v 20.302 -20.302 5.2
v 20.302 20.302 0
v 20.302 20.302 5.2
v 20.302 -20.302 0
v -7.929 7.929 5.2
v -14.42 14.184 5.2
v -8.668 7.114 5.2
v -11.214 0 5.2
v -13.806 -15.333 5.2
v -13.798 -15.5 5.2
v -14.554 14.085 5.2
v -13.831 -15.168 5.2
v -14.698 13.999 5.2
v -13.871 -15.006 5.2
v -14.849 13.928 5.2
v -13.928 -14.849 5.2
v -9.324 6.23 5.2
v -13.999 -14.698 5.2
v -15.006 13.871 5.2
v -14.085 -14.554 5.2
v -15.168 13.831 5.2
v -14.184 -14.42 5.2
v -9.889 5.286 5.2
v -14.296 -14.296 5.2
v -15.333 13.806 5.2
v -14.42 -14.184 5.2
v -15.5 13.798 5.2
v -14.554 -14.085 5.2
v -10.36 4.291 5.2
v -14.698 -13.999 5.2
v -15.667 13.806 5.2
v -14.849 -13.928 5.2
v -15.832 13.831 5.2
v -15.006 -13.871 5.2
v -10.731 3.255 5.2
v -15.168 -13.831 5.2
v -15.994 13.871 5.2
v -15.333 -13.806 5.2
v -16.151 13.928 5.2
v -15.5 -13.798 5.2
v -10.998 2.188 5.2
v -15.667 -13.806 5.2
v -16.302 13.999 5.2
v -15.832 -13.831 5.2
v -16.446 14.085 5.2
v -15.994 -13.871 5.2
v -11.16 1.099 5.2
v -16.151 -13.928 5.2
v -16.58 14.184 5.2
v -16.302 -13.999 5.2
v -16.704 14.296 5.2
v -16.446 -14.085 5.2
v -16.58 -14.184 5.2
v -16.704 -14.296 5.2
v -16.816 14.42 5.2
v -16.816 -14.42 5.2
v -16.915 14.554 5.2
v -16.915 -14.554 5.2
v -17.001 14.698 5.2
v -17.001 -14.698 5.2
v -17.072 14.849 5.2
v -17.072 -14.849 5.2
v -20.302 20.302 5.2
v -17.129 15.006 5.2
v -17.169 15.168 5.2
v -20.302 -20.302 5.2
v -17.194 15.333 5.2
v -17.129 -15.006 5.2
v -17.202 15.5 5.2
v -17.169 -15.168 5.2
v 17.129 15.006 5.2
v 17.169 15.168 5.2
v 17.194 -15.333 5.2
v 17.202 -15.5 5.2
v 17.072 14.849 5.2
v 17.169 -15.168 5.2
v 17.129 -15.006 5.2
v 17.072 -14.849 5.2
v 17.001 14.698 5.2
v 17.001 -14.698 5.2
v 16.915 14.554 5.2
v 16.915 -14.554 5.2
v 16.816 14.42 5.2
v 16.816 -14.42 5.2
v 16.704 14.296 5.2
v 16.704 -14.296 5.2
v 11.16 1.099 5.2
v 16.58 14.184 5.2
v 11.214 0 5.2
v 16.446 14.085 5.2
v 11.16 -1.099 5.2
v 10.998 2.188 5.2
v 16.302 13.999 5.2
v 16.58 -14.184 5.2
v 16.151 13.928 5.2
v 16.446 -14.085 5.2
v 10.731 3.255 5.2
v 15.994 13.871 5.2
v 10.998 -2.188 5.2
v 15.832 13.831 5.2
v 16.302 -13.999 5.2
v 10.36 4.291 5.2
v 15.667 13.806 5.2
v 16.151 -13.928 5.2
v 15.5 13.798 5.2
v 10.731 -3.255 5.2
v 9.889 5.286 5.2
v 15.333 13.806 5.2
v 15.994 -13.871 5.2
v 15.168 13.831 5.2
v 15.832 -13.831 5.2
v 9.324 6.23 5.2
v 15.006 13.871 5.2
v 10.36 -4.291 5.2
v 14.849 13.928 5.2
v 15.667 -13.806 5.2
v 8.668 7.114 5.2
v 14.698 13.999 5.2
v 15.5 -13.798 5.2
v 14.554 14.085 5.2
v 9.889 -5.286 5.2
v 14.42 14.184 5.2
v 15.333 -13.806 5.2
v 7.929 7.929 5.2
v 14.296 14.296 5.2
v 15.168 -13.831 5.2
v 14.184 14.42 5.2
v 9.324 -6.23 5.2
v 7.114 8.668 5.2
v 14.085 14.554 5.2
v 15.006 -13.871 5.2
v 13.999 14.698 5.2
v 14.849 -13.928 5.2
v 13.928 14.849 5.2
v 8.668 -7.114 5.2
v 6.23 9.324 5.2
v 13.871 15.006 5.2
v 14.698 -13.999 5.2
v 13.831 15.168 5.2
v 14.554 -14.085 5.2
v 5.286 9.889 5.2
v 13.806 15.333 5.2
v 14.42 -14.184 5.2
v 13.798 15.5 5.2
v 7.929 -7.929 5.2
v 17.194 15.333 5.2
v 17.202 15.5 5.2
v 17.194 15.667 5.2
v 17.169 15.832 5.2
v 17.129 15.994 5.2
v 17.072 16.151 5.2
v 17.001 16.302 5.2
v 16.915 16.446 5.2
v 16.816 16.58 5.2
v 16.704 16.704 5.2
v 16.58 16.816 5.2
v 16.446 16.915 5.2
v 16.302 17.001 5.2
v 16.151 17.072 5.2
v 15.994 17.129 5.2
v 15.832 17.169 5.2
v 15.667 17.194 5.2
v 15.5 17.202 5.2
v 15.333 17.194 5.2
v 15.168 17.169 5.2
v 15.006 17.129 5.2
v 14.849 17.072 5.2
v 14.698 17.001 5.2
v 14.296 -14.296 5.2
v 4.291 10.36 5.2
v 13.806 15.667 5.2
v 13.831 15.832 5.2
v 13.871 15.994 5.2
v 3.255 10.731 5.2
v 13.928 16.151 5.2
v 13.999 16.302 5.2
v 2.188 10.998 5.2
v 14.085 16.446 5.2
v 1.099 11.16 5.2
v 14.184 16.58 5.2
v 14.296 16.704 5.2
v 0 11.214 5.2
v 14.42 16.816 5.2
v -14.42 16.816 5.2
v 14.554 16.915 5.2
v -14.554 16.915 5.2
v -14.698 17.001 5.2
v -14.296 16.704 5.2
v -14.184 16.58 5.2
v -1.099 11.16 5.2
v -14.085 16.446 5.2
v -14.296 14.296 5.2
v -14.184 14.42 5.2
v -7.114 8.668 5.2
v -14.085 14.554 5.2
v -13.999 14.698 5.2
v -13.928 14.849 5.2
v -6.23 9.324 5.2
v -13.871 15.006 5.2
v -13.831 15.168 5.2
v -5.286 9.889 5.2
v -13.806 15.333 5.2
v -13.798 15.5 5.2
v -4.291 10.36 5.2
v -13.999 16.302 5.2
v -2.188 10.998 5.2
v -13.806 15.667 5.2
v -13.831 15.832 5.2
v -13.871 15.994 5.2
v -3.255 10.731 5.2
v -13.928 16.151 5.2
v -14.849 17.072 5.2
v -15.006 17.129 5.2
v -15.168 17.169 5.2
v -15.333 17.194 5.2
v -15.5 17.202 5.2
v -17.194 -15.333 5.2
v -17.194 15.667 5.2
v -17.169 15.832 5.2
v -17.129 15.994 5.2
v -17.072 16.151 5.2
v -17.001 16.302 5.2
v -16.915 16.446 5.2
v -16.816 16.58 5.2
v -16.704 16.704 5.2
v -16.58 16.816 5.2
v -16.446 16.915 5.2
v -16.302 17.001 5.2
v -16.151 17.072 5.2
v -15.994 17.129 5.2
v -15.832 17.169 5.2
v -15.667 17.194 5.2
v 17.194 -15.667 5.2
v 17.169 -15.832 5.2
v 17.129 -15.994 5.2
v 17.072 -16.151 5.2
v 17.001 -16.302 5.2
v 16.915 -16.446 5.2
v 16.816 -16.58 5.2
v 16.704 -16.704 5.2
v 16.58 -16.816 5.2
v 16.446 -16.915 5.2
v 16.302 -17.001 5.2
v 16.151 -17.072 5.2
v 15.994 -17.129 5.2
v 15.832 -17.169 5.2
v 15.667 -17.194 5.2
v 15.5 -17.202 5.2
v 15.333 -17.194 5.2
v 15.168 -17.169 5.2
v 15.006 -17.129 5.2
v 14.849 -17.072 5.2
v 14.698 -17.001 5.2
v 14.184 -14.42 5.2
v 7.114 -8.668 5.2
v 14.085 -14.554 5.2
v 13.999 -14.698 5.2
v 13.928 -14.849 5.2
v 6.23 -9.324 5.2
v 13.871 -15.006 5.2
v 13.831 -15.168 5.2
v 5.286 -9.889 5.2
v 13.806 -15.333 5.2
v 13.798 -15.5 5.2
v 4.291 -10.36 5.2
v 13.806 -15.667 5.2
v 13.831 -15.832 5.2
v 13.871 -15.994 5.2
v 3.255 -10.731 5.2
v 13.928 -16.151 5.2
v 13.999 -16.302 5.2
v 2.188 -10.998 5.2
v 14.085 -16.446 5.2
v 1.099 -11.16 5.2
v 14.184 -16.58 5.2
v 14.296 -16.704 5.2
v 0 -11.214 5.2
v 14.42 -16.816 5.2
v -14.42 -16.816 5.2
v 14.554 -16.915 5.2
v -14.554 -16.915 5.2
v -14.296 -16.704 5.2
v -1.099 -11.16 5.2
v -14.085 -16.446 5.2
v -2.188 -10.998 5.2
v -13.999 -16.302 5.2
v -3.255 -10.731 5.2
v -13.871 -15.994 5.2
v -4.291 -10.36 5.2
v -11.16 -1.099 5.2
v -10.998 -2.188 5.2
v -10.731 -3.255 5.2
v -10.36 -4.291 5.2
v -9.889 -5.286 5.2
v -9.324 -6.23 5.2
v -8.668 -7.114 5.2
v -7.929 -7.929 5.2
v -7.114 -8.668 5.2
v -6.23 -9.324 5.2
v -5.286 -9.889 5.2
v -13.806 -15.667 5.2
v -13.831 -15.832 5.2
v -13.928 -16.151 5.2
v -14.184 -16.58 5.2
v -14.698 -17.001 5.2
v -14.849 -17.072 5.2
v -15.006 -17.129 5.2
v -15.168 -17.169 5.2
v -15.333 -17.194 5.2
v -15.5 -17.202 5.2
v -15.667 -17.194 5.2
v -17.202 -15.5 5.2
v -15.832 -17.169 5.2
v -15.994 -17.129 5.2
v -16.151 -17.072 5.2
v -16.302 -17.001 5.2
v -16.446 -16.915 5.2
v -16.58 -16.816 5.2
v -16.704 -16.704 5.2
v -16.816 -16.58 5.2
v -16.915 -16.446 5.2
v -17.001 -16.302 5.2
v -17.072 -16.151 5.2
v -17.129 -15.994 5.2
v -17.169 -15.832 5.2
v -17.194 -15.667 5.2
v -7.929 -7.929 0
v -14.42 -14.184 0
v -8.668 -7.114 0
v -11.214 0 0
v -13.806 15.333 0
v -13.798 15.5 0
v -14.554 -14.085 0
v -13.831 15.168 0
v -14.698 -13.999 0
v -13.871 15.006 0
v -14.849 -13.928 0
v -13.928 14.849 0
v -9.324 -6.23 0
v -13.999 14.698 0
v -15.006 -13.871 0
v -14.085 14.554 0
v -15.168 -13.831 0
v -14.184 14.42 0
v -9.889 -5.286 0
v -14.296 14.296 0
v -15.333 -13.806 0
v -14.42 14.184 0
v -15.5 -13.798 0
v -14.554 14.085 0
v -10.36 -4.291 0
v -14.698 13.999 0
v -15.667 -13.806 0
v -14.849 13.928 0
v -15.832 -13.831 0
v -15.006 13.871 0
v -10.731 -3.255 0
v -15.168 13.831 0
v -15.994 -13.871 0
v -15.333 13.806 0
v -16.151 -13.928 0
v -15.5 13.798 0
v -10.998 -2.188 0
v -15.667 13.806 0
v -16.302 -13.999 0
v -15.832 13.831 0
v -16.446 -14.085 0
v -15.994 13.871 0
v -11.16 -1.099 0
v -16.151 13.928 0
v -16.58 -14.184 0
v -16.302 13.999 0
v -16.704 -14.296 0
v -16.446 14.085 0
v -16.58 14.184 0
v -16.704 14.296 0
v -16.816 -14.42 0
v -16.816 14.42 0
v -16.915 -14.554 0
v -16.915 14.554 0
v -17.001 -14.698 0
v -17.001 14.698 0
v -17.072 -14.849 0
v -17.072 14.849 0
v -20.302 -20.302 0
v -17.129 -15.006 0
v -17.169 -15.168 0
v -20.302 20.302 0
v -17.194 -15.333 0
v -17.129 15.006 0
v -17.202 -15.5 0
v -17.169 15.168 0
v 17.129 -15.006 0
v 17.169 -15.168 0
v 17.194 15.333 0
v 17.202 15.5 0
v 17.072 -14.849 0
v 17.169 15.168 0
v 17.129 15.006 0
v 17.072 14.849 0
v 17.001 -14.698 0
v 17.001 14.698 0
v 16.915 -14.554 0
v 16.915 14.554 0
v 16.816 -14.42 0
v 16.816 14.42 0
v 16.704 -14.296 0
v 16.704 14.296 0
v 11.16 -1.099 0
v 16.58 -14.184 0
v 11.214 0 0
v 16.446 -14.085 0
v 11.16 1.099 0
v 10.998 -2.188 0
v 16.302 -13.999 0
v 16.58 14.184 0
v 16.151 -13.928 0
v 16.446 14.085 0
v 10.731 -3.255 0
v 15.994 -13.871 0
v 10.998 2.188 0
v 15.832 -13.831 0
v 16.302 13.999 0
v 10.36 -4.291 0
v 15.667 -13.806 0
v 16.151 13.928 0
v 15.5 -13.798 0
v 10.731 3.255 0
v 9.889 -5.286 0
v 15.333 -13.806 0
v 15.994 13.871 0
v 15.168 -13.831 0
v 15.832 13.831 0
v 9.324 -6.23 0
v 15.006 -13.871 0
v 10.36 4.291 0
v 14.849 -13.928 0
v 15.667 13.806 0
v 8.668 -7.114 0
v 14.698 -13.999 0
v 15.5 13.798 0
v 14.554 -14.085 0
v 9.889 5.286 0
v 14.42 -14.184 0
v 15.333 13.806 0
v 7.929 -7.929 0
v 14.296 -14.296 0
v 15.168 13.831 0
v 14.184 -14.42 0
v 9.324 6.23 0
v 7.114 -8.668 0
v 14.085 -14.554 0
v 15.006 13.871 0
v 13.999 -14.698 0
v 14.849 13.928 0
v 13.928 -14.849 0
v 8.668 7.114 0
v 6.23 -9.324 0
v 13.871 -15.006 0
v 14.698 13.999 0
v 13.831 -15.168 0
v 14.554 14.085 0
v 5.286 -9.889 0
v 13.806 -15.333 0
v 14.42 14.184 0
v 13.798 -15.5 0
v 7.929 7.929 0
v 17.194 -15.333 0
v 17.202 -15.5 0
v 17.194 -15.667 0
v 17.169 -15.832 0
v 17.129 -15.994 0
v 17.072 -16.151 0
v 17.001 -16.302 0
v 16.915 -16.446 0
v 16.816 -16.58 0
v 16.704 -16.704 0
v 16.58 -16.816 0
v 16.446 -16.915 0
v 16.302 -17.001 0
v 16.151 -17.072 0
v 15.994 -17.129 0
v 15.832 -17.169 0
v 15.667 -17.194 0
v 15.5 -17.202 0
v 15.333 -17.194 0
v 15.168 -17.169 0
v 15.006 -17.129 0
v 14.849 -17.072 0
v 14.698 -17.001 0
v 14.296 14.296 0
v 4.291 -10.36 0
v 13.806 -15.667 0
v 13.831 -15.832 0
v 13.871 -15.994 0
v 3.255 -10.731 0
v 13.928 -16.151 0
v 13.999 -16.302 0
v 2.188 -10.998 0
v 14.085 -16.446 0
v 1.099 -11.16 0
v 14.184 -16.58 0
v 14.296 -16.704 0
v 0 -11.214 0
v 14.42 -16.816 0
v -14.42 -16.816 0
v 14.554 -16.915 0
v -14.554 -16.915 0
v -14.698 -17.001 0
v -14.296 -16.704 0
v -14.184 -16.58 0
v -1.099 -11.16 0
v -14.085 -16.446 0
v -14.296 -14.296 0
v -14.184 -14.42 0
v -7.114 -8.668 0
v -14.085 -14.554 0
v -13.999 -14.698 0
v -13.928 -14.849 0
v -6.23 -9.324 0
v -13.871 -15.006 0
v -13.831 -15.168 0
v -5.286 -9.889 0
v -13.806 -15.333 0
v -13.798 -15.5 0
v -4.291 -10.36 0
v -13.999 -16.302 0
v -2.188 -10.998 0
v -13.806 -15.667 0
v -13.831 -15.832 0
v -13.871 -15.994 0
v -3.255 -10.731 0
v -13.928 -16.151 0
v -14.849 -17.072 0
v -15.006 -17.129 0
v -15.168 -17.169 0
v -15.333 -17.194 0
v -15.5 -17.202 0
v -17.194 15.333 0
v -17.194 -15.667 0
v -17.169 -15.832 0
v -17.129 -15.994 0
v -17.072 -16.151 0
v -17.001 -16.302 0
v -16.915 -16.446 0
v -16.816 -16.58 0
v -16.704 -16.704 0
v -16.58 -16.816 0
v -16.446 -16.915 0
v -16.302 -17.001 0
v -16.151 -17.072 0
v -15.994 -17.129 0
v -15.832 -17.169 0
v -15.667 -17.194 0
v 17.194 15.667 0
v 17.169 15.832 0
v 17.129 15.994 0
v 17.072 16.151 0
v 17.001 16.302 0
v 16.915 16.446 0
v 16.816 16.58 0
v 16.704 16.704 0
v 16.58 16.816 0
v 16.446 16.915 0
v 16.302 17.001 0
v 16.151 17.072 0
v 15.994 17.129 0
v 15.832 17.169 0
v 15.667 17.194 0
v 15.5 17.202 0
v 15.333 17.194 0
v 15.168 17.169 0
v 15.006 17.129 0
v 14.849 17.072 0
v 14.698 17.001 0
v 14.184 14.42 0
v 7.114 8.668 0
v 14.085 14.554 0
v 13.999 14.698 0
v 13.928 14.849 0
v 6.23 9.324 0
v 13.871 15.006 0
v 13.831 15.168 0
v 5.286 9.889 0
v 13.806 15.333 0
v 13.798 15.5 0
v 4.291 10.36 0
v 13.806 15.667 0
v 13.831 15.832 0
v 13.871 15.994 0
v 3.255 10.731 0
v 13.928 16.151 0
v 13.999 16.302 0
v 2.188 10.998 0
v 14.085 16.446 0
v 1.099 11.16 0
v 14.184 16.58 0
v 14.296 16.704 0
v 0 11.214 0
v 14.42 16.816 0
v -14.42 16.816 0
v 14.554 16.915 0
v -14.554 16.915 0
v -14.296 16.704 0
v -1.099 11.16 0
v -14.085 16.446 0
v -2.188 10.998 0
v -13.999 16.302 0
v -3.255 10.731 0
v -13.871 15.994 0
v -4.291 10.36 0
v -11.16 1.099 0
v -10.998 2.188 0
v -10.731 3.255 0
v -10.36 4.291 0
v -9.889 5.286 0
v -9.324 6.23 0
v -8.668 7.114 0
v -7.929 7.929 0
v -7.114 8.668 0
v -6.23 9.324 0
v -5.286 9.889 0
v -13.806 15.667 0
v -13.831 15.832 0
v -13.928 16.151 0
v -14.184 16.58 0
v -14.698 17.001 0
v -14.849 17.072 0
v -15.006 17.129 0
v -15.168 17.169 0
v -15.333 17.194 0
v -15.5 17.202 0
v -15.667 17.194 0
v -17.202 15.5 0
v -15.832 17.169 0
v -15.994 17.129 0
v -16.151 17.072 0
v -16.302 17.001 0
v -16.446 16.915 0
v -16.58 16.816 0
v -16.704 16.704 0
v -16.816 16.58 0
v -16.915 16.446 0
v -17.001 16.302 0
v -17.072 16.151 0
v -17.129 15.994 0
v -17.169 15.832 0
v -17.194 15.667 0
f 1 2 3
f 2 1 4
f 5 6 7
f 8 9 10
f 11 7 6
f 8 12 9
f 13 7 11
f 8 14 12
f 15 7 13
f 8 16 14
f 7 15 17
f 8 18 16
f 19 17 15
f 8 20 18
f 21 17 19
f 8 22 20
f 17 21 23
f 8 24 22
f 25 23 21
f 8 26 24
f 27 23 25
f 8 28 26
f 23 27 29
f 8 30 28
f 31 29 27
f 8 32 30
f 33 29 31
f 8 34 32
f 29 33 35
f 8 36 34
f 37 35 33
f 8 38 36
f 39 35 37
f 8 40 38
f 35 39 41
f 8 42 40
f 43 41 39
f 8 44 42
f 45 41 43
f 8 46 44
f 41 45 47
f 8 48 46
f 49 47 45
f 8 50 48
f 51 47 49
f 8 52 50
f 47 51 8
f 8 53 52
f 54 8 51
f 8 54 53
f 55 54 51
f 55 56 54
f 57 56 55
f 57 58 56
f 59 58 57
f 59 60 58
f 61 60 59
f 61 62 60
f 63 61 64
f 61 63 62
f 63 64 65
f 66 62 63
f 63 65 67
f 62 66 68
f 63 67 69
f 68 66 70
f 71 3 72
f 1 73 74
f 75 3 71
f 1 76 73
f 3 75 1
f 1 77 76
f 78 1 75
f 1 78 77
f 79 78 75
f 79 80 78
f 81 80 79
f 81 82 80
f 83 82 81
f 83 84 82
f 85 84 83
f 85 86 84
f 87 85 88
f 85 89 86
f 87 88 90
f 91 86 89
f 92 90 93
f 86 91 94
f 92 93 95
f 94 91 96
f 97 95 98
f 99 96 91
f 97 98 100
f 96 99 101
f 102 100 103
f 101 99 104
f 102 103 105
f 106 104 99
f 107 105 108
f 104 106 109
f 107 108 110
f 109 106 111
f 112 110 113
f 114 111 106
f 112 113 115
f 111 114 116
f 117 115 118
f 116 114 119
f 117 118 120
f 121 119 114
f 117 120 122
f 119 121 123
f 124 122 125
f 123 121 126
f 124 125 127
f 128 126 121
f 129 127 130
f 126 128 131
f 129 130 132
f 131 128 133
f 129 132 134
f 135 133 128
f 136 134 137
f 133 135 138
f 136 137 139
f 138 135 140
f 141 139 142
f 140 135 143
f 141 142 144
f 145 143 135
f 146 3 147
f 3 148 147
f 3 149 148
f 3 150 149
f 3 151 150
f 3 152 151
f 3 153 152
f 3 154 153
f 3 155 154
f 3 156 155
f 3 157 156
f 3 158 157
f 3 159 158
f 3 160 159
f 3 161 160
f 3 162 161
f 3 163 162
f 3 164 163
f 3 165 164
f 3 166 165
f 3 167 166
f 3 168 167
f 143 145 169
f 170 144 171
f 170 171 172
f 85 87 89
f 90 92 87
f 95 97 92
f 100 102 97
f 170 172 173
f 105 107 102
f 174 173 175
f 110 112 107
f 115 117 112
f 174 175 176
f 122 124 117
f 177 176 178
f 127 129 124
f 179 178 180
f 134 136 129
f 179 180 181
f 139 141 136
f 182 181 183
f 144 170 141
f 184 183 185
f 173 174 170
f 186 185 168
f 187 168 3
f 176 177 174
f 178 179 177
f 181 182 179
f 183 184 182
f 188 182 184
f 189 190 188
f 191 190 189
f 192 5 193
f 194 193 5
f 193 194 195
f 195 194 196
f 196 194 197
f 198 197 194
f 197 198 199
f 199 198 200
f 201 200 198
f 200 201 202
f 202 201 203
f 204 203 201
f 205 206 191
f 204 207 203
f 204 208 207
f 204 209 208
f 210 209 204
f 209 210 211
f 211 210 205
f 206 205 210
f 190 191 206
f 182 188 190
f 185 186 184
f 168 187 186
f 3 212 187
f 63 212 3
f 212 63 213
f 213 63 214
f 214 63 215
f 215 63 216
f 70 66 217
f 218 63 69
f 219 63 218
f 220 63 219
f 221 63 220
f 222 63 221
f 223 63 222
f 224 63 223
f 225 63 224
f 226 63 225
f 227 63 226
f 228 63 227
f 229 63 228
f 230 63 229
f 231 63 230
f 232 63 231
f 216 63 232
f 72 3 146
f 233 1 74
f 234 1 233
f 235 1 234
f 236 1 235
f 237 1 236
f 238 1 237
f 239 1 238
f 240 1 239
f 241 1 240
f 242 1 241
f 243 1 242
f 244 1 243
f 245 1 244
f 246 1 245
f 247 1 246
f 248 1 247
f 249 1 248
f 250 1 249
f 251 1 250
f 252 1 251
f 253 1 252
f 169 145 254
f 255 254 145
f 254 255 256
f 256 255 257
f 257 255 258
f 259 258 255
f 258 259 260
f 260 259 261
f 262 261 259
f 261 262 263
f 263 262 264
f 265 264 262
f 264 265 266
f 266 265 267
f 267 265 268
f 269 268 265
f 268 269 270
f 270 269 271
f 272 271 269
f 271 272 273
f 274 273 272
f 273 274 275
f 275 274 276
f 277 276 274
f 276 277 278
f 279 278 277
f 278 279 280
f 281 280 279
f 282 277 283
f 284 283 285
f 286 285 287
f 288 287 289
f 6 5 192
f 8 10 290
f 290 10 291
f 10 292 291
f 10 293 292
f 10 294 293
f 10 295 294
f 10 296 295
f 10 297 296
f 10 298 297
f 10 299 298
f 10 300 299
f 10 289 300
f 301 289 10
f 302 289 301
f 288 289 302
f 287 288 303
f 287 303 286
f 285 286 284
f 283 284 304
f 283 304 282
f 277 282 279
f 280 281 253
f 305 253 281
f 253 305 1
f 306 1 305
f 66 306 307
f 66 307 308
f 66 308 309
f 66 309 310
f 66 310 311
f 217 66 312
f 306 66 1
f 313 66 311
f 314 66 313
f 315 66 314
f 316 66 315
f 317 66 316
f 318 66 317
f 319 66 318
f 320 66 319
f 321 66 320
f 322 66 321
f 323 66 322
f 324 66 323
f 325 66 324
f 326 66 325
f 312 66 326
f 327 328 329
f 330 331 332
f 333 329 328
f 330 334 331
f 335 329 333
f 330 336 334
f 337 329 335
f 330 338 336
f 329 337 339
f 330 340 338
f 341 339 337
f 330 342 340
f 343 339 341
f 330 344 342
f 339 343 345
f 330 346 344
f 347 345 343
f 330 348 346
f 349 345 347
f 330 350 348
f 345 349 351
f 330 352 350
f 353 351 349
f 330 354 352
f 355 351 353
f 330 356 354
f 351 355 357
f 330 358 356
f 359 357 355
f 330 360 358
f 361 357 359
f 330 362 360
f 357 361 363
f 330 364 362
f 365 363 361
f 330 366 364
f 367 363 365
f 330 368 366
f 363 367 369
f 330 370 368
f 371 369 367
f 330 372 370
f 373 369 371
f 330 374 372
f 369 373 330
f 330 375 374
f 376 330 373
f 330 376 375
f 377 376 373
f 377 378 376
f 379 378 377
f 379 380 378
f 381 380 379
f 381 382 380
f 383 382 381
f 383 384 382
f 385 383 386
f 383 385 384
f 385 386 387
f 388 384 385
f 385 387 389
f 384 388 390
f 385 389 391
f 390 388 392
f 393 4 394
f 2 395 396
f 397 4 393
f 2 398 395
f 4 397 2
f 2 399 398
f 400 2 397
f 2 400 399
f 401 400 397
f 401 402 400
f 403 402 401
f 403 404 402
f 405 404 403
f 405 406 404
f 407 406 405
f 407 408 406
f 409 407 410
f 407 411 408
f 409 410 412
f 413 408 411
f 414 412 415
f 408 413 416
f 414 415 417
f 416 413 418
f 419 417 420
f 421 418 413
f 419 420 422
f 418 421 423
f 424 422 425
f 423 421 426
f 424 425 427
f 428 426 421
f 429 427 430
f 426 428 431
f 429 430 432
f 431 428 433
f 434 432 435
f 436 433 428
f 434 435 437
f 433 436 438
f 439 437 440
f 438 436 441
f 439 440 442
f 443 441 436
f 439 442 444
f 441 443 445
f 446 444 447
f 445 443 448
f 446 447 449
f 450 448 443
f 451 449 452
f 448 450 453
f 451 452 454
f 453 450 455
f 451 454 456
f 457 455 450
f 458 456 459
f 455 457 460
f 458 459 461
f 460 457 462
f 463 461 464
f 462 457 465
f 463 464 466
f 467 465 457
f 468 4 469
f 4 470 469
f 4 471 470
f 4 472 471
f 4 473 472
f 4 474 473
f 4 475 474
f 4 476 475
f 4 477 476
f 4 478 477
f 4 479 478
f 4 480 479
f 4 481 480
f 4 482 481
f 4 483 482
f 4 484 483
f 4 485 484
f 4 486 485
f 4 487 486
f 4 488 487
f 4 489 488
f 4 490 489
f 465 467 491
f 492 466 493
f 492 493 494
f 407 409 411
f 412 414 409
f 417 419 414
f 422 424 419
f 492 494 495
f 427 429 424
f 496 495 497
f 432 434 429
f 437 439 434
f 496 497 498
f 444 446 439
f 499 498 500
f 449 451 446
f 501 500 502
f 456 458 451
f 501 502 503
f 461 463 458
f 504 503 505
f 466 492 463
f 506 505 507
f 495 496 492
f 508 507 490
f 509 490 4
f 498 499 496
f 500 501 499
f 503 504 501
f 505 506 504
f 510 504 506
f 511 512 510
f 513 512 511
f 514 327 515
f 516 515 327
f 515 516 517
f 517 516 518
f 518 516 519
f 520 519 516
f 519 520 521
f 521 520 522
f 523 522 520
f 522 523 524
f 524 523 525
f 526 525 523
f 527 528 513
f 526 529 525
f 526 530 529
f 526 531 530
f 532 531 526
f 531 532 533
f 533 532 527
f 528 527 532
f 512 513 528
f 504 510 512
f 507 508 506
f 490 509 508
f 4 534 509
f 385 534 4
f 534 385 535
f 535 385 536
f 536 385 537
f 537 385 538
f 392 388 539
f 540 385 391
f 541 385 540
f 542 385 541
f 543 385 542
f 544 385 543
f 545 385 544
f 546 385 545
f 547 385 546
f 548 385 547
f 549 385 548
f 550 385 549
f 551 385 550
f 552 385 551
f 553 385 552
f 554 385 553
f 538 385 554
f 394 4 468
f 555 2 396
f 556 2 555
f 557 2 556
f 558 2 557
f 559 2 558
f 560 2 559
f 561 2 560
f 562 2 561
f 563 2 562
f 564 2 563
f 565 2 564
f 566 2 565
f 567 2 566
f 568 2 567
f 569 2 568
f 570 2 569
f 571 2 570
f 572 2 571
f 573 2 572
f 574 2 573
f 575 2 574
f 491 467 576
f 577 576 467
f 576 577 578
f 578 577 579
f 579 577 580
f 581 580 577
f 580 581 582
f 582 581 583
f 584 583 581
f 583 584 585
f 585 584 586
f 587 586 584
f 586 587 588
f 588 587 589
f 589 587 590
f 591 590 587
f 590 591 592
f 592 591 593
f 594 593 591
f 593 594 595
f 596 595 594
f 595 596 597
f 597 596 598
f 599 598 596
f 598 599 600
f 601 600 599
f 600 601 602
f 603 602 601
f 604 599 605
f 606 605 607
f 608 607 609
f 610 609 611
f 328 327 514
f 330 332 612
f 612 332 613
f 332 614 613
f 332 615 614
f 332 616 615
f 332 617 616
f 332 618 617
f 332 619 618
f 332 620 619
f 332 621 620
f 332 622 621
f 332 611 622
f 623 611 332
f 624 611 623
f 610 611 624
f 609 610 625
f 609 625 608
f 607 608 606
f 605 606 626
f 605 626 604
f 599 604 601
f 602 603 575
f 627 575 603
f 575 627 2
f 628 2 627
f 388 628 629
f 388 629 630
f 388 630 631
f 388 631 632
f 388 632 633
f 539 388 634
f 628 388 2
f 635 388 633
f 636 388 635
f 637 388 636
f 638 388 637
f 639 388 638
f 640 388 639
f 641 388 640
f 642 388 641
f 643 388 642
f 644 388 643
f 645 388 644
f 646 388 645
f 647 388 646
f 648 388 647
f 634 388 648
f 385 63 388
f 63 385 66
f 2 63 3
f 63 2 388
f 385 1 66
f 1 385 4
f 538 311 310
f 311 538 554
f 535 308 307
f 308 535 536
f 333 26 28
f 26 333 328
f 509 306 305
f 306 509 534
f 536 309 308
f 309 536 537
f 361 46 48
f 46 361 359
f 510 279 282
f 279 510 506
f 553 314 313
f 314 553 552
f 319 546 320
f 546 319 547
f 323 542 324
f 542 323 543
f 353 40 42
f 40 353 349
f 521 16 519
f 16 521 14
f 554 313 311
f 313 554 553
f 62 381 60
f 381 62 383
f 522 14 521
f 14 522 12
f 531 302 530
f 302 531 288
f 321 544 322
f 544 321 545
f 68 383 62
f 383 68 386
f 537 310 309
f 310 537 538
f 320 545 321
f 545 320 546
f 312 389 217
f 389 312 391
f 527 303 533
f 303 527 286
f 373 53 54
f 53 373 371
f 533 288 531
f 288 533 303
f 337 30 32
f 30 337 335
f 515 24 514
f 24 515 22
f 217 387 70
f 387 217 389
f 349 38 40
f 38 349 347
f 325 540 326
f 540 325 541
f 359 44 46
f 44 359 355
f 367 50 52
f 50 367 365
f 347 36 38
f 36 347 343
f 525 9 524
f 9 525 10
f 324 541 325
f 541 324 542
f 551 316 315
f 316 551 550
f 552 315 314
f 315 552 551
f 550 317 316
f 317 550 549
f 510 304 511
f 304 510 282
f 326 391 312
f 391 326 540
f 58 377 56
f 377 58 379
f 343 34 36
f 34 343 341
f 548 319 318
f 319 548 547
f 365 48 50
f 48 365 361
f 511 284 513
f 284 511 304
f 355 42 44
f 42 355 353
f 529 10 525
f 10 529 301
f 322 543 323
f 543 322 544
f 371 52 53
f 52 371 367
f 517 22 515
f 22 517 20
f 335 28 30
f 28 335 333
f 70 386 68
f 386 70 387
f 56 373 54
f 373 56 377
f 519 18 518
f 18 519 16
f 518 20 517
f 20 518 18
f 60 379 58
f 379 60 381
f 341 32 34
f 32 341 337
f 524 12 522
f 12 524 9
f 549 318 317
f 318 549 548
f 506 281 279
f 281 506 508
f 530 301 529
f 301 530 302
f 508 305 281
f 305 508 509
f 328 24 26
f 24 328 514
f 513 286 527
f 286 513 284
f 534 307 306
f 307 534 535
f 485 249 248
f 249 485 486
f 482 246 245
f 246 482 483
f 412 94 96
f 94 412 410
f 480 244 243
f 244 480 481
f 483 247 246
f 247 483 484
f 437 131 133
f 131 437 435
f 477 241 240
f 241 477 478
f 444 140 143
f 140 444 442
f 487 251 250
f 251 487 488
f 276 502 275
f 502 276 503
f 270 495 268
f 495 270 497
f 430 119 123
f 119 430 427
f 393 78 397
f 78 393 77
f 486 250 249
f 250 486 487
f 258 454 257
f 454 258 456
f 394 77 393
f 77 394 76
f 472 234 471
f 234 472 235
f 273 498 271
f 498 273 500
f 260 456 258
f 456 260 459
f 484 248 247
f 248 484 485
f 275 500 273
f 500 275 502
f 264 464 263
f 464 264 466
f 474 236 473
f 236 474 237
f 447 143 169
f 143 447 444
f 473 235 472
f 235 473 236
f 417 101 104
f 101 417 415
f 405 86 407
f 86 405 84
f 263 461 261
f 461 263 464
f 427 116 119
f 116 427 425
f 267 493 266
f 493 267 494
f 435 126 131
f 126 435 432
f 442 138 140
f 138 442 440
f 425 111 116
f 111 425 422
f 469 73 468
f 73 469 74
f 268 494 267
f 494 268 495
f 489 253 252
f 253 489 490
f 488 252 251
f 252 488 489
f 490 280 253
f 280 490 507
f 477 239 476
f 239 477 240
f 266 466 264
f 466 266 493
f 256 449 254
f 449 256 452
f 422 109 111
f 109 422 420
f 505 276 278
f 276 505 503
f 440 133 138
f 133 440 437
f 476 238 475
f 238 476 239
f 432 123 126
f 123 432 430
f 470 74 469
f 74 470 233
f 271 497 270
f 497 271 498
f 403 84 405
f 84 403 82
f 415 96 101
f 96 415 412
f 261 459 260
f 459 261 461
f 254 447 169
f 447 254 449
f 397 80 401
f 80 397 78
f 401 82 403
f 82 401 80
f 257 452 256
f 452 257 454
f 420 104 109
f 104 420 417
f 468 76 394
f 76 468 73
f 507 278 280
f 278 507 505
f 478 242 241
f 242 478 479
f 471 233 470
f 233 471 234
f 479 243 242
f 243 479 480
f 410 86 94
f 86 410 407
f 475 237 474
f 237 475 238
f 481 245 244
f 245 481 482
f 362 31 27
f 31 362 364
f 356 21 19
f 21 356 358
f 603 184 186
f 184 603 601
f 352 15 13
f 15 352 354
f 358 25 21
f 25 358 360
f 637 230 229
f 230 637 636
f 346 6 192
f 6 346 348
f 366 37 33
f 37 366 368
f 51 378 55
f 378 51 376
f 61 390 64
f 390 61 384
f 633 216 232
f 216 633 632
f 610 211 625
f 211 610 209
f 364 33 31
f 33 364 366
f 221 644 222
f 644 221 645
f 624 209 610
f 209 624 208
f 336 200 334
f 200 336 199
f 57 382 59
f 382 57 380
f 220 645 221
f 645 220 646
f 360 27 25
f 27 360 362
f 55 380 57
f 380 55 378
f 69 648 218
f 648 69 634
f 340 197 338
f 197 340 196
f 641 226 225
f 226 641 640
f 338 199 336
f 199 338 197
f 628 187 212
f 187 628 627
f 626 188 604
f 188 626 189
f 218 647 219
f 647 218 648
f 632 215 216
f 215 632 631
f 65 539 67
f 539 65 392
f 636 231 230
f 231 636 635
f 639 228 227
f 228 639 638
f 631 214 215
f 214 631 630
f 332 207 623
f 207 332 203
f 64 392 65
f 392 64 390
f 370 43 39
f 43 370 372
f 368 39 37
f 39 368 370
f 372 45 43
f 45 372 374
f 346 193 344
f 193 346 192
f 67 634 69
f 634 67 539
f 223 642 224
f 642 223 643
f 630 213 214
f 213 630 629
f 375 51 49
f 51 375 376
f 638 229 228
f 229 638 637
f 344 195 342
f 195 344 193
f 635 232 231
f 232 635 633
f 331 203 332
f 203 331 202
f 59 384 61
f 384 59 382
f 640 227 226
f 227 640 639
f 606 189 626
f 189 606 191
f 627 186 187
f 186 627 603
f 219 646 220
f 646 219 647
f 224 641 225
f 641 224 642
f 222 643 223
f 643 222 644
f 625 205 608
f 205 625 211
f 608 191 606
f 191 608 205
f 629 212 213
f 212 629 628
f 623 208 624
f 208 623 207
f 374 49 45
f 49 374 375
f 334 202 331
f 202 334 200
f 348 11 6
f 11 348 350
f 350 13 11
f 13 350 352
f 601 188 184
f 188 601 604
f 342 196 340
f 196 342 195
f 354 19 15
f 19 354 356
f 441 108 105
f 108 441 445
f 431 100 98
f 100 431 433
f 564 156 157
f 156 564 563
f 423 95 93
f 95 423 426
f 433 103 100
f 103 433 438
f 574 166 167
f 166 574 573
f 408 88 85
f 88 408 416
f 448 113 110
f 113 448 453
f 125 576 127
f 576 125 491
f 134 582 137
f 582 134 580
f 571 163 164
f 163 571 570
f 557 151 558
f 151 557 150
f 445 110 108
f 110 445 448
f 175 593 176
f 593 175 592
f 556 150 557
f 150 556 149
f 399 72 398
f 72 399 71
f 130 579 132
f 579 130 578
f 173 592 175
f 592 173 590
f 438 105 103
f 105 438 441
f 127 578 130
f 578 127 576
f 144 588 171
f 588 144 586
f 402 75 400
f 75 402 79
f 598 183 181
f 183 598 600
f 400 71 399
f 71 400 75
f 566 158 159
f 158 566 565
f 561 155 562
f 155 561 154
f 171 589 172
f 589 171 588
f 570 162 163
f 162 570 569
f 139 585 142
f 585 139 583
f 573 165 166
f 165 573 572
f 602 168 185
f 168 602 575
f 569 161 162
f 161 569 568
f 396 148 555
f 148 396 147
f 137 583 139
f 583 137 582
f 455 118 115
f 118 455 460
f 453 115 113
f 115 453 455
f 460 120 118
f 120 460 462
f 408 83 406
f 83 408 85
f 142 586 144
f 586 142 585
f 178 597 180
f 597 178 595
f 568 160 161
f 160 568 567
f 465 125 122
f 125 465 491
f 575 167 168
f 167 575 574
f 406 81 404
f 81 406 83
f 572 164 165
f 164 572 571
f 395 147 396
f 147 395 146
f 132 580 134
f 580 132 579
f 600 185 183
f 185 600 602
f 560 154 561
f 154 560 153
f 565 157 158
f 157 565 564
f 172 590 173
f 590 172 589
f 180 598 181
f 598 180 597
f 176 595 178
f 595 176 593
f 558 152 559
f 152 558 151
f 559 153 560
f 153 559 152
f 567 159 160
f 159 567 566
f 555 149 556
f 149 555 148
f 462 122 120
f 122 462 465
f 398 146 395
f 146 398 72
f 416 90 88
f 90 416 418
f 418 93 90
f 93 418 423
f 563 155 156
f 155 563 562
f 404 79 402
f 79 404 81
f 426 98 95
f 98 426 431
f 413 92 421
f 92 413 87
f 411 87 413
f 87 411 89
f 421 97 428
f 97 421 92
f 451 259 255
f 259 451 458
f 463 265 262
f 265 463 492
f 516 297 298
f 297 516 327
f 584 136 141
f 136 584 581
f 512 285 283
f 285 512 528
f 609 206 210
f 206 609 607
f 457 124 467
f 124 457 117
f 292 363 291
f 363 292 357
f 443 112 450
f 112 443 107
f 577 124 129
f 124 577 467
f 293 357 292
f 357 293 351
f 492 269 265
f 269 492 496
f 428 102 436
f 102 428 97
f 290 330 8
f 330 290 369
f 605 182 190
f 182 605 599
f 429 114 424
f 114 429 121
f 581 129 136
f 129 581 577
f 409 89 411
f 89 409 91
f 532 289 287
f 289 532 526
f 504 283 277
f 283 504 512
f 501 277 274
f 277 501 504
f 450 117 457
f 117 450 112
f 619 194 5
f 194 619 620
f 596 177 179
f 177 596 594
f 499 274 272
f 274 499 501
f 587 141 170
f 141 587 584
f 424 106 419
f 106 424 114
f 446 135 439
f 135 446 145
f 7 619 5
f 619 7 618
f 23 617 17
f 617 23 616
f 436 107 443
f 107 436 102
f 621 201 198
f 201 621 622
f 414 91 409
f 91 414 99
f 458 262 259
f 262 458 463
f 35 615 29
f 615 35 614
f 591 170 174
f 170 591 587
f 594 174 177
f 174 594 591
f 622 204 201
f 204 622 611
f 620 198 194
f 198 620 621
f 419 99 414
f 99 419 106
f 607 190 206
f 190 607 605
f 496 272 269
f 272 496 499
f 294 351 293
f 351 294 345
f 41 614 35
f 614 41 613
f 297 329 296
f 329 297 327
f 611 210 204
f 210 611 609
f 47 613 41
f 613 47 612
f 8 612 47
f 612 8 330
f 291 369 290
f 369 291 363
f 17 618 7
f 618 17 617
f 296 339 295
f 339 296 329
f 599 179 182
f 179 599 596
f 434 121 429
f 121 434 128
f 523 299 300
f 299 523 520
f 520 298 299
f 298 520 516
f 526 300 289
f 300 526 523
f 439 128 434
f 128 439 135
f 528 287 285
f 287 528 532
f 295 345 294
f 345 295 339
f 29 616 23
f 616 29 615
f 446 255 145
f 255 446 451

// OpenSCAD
// render file: printed bodies, closed pose
// body plate
difference() {
  color("#4f81bd") union() {
    // body plate (plate)
    multmatrix([[1, 0, 0, 0], [0, 1, 0, 0], [0, 0, 1, 0], [0, 0, 0, 1]]) translate([-20.30205, -20.30205, 0]) cube([40.6041, 40.6041, 5.2]);
  }
  // cut slot_0 (bolt_slot)
  multmatrix([[1, 0, 0, -15.5], [0, 1, 0, -15.5], [0, 0, 1, -1], [0, 0, 0, 1]]) linear_extrude(height=7.2) polygon(points=[[0, -1.70205], [0.16683, -1.693854], [0.332054, -1.669346], [0.494079, -1.62876], [0.651346, -1.572489], [0.802341, -1.501074], [0.945608, -1.415203], [1.079769, -1.315703], [1.203531, -1.203531], [1.315703, -1.079769], [1.415203, -0.945608], [1.501074, -0.802341], [1.572489, -0.651346], [1.62876, -0.494079], [1.669346, -0.332054], [1.693854, -0.16683], [1.70205, 0], [1.70205, 0], [1.693854, 0.16683], [1.669346, 0.332054], [1.62876, 0.494079], [1.572489, 0.651346], [1.501074, 0.802341], [1.415203, 0.945608], [1.315703, 1.079769], [1.203531, 1.203531], [1.079769, 1.315703], [0.945608, 1.415203], [0.802341, 1.501074], [0.651346, 1.572489], [0.494079, 1.62876], [0.332054, 1.669346], [0.16683, 1.693854], [0, 1.70205], [0, 1.70205], [-0.16683, 1.693854], [-0.332054, 1.669346], [-0.494079, 1.62876], [-0.651346, 1.572489], [-0.802341, 1.501074], [-0.945608, 1.415203], [-1.079769, 1.315703], [-1.203531, 1.203531], [-1.315703, 1.079769], [-1.415203, 0.945608], [-1.501074, 0.802341], [-1.572489, 0.651346], [-1.62876, 0.494079], [-1.669346, 0.332054], [-1.693854, 0.16683], [-1.70205, 0], [-1.70205, 0], [-1.693854, -0.16683], [-1.669346, -0.332054], [-1.62876, -0.494079], [-1.572489, -0.651346], [-1.501074, -0.802341], [-1.415203, -0.945608], [-1.315703, -1.079769], [-1.203531, -1.203531], [-1.079769, -1.315703], [-0.945608, -1.415203], [-0.802341, -1.501074], [-0.651346, -1.572489], [-0.494079, -1.62876], [-0.332054, -1.669346], [-0.16683, -1.693854], [0, -1.70205]]);
  // cut slot_1 (bolt_slot)
  multmatrix([[1, 0, 0, 15.5], [0, 1, 0, -15.5], [0, 0, 1, -1], [0, 0, 0, 1]]) linear_extrude(height=7.2) polygon(points=[[0, -1.70205], [0.16683, -1.693854], [0.332054, -1.669346], [0.494079, -1.62876], [0.651346, -1.572489], [0.802341, -1.501074], [0.945608, -1.415203], [1.079769, -1.315703], [1.203531, -1.203531], [1.315703, -1.079769], [1.415203, -0.945608], [1.501074, -0.802341], [1.572489, -0.651346], [1.62876, -0.494079], [1.669346, -0.332054], [1.693854, -0.16683], [1.70205, 0], [1.70205, 0], [1.693854, 0.16683], [1.669346, 0.332054], [1.62876, 0.494079], [1.572489, 0.651346], [1.501074, 0.802341], [1.415203, 0.945608], [1.315703, 1.079769], [1.203531, 1.203531], [1.079769, 1.315703], [0.945608, 1.415203], [0.802341, 1.501074], [0.651346, 1.572489], [0.494079, 1.62876], [0.332054, 1.669346], [0.16683, 1.693854], [0, 1.70205], [0, 1.70205], [-0.16683, 1.693854], [-0.332054, 1.669346], [-0.494079, 1.62876], [-0.651346, 1.572489], [-0.802341, 1.501074], [-0.945608, 1.415203], [-1.079769, 1.315703], [-1.203531, 1.203531], [-1.315703, 1.079769], [-1.415203, 0.945608], [-1.501074, 0.802341], [-1.572489, 0.651346], [-1.62876, 0.494079], [-1.669346, 0.332054], [-1.693854, 0.16683], [-1.70205, 0], [-1.70205, 0], [-1.693854, -0.16683], [-1.669346, -0.332054], [-1.62876, -0.494079], [-1.572489, -0.651346], [-1.501074, -0.802341], [-1.415203, -0.945608], [-1.315703, -1.079769], [-1.203531, -1.203531], [-1.079769, -1.315703], [-0.945608, -1.415203], [-0.802341, -1.501074], [-0.651346, -1.572489], [-0.494079, -1.62876], [-0.332054, -1.669346], [-0.16683, -1.693854], [0, -1.70205]]);
  // cut slot_2 (bolt_slot)
  multmatrix([[1, 0, 0, -15.5], [0, 1, 0, 15.5], [0, 0, 1, -1], [0, 0, 0, 1]]) linear_extrude(height=7.2) polygon(points=[[0, -1.70205], [0.16683, -1.693854], [0.332054, -1.669346], [0.494079, -1.62876], [0.651346, -1.572489], [0.802341, -1.501074], [0.945608, -1.415203], [1.079769, -1.315703], [1.203531, -1.203531], [1.315703, -1.079769], [1.415203, -0.945608], [1.501074, -0.802341], [1.572489, -0.651346], [1.62876, -0.494079], [1.669346, -0.332054], [1.693854, -0.16683], [1.70205, 0], [1.70205, 0], [1.693854, 0.16683], [1.669346, 0.332054], [1.62876, 0.494079], [1.572489, 0.651346], [1.501074, 0.802341], [1.415203, 0.945608], [1.315703, 1.079769], [1.203531, 1.203531], [1.079769, 1.315703], [0.945608, 1.415203], [0.802341, 1.501074], [0.651346, 1.572489], [0.494079, 1.62876], [0.332054, 1.669346], [0.16683, 1.693854], [0, 1.70205], [0, 1.70205], [-0.16683, 1.693854], [-0.332054, 1.669346], [-0.494079, 1.62876], [-0.651346, 1.572489], [-0.802341, 1.501074], [-0.945608, 1.415203], [-1.079769, 1.315703], [-1.203531, 1.203531], [-1.315703, 1.079769], [-1.415203, 0.945608], [-1.501074, 0.802341], [-1.572489, 0.651346], [-1.62876, 0.494079], [-1.669346, 0.332054], [-1.693854, 0.16683], [-1.70205, 0], [-1.70205, 0], [-1.693854, -0.16683], [-1.669346, -0.332054], [-1.62876, -0.494079], [-1.572489, -0.651346], [-1.501074, -0.802341], [-1.415203, -0.945608], [-1.315703, -1.079769], [-1.203531, -1.203531], [-1.079769, -1.315703], [-0.945608, -1.415203], [-0.802341, -1.501074], [-0.651346, -1.572489], [-0.494079, -1.62876], [-0.332054, -1.669346], [-0.16683, -1.693854], [0, -1.70205]]);
  // cut slot_3 (bolt_slot)
  multmatrix([[1, 0, 0, 15.5], [0, 1, 0, 15.5], [0, 0, 1, -1], [0, 0, 0, 1]]) linear_extrude(height=7.2) polygon(points=[[0, -1.70205], [0.16683, -1.693854], [0.332054, -1.669346], [0.494079, -1.62876], [0.651346, -1.572489], [0.802341, -1.501074], [0.945608, -1.415203], [1.079769, -1.315703], [1.203531, -1.203531], [1.315703, -1.079769], [1.415203, -0.945608], [1.501074, -0.802341], [1.572489, -0.651346], [1.62876, -0.494079], [1.669346, -0.332054], [1.693854, -0.16683], [1.70205, 0], [1.70205, 0], [1.693854, 0.16683], [1.669346, 0.332054], [1.62876, 0.494079], [1.572489, 0.651346], [1.501074, 0.802341], [1.415203, 0.945608], [1.315703, 1.079769], [1.203531, 1.203531], [1.079769, 1.315703], [0.945608, 1.415203], [0.802341, 1.501074], [0.651346, 1.572489], [0.494079, 1.62876], [0.332054, 1.669346], [0.16683, 1.693854], [0, 1.70205], [0, 1.70205], [-0.16683, 1.693854], [-0.332054, 1.669346], [-0.494079, 1.62876], [-0.651346, 1.572489], [-0.802341, 1.501074], [-0.945608, 1.415203], [-1.079769, 1.315703], [-1.203531, 1.203531], [-1.315703, 1.079769], [-1.415203, 0.945608], [-1.501074, 0.802341], [-1.572489, 0.651346], [-1.62876, 0.494079], [-1.669346, 0.332054], [-1.693854, 0.16683], [-1.70205, 0], [-1.70205, 0], [-1.693854, -0.16683], [-1.669346, -0.332054], [-1.62876, -0.494079], [-1.572489, -0.651346], [-1.501074, -0.802341], [-1.415203, -0.945608], [-1.315703, -1.079769], [-1.203531, -1.203531], [-1.079769, -1.315703], [-0.945608, -1.415203], [-0.802341, -1.501074], [-0.651346, -1.572489], [-0.494079, -1.62876], [-0.332054, -1.669346], [-0.16683, -1.693854], [0, -1.70205]]);
  // cut clear_pilot (recess)
  multmatrix([[1, 0, 0, 0], [0, 1, 0, 0], [0, 0, 1, -1], [0, 0, 0, 1]]) cylinder(h=7.2, d=22.427014, $fn=64);
  // cut clear_shaft (recess)
  multmatrix([[1, 0, 0, 0], [0, 1, 0, 0], [0, 0, 1, -1], [0, 0, 0, 1]]) cylinder(h=7.2, d=5.406512, $fn=64);
}
